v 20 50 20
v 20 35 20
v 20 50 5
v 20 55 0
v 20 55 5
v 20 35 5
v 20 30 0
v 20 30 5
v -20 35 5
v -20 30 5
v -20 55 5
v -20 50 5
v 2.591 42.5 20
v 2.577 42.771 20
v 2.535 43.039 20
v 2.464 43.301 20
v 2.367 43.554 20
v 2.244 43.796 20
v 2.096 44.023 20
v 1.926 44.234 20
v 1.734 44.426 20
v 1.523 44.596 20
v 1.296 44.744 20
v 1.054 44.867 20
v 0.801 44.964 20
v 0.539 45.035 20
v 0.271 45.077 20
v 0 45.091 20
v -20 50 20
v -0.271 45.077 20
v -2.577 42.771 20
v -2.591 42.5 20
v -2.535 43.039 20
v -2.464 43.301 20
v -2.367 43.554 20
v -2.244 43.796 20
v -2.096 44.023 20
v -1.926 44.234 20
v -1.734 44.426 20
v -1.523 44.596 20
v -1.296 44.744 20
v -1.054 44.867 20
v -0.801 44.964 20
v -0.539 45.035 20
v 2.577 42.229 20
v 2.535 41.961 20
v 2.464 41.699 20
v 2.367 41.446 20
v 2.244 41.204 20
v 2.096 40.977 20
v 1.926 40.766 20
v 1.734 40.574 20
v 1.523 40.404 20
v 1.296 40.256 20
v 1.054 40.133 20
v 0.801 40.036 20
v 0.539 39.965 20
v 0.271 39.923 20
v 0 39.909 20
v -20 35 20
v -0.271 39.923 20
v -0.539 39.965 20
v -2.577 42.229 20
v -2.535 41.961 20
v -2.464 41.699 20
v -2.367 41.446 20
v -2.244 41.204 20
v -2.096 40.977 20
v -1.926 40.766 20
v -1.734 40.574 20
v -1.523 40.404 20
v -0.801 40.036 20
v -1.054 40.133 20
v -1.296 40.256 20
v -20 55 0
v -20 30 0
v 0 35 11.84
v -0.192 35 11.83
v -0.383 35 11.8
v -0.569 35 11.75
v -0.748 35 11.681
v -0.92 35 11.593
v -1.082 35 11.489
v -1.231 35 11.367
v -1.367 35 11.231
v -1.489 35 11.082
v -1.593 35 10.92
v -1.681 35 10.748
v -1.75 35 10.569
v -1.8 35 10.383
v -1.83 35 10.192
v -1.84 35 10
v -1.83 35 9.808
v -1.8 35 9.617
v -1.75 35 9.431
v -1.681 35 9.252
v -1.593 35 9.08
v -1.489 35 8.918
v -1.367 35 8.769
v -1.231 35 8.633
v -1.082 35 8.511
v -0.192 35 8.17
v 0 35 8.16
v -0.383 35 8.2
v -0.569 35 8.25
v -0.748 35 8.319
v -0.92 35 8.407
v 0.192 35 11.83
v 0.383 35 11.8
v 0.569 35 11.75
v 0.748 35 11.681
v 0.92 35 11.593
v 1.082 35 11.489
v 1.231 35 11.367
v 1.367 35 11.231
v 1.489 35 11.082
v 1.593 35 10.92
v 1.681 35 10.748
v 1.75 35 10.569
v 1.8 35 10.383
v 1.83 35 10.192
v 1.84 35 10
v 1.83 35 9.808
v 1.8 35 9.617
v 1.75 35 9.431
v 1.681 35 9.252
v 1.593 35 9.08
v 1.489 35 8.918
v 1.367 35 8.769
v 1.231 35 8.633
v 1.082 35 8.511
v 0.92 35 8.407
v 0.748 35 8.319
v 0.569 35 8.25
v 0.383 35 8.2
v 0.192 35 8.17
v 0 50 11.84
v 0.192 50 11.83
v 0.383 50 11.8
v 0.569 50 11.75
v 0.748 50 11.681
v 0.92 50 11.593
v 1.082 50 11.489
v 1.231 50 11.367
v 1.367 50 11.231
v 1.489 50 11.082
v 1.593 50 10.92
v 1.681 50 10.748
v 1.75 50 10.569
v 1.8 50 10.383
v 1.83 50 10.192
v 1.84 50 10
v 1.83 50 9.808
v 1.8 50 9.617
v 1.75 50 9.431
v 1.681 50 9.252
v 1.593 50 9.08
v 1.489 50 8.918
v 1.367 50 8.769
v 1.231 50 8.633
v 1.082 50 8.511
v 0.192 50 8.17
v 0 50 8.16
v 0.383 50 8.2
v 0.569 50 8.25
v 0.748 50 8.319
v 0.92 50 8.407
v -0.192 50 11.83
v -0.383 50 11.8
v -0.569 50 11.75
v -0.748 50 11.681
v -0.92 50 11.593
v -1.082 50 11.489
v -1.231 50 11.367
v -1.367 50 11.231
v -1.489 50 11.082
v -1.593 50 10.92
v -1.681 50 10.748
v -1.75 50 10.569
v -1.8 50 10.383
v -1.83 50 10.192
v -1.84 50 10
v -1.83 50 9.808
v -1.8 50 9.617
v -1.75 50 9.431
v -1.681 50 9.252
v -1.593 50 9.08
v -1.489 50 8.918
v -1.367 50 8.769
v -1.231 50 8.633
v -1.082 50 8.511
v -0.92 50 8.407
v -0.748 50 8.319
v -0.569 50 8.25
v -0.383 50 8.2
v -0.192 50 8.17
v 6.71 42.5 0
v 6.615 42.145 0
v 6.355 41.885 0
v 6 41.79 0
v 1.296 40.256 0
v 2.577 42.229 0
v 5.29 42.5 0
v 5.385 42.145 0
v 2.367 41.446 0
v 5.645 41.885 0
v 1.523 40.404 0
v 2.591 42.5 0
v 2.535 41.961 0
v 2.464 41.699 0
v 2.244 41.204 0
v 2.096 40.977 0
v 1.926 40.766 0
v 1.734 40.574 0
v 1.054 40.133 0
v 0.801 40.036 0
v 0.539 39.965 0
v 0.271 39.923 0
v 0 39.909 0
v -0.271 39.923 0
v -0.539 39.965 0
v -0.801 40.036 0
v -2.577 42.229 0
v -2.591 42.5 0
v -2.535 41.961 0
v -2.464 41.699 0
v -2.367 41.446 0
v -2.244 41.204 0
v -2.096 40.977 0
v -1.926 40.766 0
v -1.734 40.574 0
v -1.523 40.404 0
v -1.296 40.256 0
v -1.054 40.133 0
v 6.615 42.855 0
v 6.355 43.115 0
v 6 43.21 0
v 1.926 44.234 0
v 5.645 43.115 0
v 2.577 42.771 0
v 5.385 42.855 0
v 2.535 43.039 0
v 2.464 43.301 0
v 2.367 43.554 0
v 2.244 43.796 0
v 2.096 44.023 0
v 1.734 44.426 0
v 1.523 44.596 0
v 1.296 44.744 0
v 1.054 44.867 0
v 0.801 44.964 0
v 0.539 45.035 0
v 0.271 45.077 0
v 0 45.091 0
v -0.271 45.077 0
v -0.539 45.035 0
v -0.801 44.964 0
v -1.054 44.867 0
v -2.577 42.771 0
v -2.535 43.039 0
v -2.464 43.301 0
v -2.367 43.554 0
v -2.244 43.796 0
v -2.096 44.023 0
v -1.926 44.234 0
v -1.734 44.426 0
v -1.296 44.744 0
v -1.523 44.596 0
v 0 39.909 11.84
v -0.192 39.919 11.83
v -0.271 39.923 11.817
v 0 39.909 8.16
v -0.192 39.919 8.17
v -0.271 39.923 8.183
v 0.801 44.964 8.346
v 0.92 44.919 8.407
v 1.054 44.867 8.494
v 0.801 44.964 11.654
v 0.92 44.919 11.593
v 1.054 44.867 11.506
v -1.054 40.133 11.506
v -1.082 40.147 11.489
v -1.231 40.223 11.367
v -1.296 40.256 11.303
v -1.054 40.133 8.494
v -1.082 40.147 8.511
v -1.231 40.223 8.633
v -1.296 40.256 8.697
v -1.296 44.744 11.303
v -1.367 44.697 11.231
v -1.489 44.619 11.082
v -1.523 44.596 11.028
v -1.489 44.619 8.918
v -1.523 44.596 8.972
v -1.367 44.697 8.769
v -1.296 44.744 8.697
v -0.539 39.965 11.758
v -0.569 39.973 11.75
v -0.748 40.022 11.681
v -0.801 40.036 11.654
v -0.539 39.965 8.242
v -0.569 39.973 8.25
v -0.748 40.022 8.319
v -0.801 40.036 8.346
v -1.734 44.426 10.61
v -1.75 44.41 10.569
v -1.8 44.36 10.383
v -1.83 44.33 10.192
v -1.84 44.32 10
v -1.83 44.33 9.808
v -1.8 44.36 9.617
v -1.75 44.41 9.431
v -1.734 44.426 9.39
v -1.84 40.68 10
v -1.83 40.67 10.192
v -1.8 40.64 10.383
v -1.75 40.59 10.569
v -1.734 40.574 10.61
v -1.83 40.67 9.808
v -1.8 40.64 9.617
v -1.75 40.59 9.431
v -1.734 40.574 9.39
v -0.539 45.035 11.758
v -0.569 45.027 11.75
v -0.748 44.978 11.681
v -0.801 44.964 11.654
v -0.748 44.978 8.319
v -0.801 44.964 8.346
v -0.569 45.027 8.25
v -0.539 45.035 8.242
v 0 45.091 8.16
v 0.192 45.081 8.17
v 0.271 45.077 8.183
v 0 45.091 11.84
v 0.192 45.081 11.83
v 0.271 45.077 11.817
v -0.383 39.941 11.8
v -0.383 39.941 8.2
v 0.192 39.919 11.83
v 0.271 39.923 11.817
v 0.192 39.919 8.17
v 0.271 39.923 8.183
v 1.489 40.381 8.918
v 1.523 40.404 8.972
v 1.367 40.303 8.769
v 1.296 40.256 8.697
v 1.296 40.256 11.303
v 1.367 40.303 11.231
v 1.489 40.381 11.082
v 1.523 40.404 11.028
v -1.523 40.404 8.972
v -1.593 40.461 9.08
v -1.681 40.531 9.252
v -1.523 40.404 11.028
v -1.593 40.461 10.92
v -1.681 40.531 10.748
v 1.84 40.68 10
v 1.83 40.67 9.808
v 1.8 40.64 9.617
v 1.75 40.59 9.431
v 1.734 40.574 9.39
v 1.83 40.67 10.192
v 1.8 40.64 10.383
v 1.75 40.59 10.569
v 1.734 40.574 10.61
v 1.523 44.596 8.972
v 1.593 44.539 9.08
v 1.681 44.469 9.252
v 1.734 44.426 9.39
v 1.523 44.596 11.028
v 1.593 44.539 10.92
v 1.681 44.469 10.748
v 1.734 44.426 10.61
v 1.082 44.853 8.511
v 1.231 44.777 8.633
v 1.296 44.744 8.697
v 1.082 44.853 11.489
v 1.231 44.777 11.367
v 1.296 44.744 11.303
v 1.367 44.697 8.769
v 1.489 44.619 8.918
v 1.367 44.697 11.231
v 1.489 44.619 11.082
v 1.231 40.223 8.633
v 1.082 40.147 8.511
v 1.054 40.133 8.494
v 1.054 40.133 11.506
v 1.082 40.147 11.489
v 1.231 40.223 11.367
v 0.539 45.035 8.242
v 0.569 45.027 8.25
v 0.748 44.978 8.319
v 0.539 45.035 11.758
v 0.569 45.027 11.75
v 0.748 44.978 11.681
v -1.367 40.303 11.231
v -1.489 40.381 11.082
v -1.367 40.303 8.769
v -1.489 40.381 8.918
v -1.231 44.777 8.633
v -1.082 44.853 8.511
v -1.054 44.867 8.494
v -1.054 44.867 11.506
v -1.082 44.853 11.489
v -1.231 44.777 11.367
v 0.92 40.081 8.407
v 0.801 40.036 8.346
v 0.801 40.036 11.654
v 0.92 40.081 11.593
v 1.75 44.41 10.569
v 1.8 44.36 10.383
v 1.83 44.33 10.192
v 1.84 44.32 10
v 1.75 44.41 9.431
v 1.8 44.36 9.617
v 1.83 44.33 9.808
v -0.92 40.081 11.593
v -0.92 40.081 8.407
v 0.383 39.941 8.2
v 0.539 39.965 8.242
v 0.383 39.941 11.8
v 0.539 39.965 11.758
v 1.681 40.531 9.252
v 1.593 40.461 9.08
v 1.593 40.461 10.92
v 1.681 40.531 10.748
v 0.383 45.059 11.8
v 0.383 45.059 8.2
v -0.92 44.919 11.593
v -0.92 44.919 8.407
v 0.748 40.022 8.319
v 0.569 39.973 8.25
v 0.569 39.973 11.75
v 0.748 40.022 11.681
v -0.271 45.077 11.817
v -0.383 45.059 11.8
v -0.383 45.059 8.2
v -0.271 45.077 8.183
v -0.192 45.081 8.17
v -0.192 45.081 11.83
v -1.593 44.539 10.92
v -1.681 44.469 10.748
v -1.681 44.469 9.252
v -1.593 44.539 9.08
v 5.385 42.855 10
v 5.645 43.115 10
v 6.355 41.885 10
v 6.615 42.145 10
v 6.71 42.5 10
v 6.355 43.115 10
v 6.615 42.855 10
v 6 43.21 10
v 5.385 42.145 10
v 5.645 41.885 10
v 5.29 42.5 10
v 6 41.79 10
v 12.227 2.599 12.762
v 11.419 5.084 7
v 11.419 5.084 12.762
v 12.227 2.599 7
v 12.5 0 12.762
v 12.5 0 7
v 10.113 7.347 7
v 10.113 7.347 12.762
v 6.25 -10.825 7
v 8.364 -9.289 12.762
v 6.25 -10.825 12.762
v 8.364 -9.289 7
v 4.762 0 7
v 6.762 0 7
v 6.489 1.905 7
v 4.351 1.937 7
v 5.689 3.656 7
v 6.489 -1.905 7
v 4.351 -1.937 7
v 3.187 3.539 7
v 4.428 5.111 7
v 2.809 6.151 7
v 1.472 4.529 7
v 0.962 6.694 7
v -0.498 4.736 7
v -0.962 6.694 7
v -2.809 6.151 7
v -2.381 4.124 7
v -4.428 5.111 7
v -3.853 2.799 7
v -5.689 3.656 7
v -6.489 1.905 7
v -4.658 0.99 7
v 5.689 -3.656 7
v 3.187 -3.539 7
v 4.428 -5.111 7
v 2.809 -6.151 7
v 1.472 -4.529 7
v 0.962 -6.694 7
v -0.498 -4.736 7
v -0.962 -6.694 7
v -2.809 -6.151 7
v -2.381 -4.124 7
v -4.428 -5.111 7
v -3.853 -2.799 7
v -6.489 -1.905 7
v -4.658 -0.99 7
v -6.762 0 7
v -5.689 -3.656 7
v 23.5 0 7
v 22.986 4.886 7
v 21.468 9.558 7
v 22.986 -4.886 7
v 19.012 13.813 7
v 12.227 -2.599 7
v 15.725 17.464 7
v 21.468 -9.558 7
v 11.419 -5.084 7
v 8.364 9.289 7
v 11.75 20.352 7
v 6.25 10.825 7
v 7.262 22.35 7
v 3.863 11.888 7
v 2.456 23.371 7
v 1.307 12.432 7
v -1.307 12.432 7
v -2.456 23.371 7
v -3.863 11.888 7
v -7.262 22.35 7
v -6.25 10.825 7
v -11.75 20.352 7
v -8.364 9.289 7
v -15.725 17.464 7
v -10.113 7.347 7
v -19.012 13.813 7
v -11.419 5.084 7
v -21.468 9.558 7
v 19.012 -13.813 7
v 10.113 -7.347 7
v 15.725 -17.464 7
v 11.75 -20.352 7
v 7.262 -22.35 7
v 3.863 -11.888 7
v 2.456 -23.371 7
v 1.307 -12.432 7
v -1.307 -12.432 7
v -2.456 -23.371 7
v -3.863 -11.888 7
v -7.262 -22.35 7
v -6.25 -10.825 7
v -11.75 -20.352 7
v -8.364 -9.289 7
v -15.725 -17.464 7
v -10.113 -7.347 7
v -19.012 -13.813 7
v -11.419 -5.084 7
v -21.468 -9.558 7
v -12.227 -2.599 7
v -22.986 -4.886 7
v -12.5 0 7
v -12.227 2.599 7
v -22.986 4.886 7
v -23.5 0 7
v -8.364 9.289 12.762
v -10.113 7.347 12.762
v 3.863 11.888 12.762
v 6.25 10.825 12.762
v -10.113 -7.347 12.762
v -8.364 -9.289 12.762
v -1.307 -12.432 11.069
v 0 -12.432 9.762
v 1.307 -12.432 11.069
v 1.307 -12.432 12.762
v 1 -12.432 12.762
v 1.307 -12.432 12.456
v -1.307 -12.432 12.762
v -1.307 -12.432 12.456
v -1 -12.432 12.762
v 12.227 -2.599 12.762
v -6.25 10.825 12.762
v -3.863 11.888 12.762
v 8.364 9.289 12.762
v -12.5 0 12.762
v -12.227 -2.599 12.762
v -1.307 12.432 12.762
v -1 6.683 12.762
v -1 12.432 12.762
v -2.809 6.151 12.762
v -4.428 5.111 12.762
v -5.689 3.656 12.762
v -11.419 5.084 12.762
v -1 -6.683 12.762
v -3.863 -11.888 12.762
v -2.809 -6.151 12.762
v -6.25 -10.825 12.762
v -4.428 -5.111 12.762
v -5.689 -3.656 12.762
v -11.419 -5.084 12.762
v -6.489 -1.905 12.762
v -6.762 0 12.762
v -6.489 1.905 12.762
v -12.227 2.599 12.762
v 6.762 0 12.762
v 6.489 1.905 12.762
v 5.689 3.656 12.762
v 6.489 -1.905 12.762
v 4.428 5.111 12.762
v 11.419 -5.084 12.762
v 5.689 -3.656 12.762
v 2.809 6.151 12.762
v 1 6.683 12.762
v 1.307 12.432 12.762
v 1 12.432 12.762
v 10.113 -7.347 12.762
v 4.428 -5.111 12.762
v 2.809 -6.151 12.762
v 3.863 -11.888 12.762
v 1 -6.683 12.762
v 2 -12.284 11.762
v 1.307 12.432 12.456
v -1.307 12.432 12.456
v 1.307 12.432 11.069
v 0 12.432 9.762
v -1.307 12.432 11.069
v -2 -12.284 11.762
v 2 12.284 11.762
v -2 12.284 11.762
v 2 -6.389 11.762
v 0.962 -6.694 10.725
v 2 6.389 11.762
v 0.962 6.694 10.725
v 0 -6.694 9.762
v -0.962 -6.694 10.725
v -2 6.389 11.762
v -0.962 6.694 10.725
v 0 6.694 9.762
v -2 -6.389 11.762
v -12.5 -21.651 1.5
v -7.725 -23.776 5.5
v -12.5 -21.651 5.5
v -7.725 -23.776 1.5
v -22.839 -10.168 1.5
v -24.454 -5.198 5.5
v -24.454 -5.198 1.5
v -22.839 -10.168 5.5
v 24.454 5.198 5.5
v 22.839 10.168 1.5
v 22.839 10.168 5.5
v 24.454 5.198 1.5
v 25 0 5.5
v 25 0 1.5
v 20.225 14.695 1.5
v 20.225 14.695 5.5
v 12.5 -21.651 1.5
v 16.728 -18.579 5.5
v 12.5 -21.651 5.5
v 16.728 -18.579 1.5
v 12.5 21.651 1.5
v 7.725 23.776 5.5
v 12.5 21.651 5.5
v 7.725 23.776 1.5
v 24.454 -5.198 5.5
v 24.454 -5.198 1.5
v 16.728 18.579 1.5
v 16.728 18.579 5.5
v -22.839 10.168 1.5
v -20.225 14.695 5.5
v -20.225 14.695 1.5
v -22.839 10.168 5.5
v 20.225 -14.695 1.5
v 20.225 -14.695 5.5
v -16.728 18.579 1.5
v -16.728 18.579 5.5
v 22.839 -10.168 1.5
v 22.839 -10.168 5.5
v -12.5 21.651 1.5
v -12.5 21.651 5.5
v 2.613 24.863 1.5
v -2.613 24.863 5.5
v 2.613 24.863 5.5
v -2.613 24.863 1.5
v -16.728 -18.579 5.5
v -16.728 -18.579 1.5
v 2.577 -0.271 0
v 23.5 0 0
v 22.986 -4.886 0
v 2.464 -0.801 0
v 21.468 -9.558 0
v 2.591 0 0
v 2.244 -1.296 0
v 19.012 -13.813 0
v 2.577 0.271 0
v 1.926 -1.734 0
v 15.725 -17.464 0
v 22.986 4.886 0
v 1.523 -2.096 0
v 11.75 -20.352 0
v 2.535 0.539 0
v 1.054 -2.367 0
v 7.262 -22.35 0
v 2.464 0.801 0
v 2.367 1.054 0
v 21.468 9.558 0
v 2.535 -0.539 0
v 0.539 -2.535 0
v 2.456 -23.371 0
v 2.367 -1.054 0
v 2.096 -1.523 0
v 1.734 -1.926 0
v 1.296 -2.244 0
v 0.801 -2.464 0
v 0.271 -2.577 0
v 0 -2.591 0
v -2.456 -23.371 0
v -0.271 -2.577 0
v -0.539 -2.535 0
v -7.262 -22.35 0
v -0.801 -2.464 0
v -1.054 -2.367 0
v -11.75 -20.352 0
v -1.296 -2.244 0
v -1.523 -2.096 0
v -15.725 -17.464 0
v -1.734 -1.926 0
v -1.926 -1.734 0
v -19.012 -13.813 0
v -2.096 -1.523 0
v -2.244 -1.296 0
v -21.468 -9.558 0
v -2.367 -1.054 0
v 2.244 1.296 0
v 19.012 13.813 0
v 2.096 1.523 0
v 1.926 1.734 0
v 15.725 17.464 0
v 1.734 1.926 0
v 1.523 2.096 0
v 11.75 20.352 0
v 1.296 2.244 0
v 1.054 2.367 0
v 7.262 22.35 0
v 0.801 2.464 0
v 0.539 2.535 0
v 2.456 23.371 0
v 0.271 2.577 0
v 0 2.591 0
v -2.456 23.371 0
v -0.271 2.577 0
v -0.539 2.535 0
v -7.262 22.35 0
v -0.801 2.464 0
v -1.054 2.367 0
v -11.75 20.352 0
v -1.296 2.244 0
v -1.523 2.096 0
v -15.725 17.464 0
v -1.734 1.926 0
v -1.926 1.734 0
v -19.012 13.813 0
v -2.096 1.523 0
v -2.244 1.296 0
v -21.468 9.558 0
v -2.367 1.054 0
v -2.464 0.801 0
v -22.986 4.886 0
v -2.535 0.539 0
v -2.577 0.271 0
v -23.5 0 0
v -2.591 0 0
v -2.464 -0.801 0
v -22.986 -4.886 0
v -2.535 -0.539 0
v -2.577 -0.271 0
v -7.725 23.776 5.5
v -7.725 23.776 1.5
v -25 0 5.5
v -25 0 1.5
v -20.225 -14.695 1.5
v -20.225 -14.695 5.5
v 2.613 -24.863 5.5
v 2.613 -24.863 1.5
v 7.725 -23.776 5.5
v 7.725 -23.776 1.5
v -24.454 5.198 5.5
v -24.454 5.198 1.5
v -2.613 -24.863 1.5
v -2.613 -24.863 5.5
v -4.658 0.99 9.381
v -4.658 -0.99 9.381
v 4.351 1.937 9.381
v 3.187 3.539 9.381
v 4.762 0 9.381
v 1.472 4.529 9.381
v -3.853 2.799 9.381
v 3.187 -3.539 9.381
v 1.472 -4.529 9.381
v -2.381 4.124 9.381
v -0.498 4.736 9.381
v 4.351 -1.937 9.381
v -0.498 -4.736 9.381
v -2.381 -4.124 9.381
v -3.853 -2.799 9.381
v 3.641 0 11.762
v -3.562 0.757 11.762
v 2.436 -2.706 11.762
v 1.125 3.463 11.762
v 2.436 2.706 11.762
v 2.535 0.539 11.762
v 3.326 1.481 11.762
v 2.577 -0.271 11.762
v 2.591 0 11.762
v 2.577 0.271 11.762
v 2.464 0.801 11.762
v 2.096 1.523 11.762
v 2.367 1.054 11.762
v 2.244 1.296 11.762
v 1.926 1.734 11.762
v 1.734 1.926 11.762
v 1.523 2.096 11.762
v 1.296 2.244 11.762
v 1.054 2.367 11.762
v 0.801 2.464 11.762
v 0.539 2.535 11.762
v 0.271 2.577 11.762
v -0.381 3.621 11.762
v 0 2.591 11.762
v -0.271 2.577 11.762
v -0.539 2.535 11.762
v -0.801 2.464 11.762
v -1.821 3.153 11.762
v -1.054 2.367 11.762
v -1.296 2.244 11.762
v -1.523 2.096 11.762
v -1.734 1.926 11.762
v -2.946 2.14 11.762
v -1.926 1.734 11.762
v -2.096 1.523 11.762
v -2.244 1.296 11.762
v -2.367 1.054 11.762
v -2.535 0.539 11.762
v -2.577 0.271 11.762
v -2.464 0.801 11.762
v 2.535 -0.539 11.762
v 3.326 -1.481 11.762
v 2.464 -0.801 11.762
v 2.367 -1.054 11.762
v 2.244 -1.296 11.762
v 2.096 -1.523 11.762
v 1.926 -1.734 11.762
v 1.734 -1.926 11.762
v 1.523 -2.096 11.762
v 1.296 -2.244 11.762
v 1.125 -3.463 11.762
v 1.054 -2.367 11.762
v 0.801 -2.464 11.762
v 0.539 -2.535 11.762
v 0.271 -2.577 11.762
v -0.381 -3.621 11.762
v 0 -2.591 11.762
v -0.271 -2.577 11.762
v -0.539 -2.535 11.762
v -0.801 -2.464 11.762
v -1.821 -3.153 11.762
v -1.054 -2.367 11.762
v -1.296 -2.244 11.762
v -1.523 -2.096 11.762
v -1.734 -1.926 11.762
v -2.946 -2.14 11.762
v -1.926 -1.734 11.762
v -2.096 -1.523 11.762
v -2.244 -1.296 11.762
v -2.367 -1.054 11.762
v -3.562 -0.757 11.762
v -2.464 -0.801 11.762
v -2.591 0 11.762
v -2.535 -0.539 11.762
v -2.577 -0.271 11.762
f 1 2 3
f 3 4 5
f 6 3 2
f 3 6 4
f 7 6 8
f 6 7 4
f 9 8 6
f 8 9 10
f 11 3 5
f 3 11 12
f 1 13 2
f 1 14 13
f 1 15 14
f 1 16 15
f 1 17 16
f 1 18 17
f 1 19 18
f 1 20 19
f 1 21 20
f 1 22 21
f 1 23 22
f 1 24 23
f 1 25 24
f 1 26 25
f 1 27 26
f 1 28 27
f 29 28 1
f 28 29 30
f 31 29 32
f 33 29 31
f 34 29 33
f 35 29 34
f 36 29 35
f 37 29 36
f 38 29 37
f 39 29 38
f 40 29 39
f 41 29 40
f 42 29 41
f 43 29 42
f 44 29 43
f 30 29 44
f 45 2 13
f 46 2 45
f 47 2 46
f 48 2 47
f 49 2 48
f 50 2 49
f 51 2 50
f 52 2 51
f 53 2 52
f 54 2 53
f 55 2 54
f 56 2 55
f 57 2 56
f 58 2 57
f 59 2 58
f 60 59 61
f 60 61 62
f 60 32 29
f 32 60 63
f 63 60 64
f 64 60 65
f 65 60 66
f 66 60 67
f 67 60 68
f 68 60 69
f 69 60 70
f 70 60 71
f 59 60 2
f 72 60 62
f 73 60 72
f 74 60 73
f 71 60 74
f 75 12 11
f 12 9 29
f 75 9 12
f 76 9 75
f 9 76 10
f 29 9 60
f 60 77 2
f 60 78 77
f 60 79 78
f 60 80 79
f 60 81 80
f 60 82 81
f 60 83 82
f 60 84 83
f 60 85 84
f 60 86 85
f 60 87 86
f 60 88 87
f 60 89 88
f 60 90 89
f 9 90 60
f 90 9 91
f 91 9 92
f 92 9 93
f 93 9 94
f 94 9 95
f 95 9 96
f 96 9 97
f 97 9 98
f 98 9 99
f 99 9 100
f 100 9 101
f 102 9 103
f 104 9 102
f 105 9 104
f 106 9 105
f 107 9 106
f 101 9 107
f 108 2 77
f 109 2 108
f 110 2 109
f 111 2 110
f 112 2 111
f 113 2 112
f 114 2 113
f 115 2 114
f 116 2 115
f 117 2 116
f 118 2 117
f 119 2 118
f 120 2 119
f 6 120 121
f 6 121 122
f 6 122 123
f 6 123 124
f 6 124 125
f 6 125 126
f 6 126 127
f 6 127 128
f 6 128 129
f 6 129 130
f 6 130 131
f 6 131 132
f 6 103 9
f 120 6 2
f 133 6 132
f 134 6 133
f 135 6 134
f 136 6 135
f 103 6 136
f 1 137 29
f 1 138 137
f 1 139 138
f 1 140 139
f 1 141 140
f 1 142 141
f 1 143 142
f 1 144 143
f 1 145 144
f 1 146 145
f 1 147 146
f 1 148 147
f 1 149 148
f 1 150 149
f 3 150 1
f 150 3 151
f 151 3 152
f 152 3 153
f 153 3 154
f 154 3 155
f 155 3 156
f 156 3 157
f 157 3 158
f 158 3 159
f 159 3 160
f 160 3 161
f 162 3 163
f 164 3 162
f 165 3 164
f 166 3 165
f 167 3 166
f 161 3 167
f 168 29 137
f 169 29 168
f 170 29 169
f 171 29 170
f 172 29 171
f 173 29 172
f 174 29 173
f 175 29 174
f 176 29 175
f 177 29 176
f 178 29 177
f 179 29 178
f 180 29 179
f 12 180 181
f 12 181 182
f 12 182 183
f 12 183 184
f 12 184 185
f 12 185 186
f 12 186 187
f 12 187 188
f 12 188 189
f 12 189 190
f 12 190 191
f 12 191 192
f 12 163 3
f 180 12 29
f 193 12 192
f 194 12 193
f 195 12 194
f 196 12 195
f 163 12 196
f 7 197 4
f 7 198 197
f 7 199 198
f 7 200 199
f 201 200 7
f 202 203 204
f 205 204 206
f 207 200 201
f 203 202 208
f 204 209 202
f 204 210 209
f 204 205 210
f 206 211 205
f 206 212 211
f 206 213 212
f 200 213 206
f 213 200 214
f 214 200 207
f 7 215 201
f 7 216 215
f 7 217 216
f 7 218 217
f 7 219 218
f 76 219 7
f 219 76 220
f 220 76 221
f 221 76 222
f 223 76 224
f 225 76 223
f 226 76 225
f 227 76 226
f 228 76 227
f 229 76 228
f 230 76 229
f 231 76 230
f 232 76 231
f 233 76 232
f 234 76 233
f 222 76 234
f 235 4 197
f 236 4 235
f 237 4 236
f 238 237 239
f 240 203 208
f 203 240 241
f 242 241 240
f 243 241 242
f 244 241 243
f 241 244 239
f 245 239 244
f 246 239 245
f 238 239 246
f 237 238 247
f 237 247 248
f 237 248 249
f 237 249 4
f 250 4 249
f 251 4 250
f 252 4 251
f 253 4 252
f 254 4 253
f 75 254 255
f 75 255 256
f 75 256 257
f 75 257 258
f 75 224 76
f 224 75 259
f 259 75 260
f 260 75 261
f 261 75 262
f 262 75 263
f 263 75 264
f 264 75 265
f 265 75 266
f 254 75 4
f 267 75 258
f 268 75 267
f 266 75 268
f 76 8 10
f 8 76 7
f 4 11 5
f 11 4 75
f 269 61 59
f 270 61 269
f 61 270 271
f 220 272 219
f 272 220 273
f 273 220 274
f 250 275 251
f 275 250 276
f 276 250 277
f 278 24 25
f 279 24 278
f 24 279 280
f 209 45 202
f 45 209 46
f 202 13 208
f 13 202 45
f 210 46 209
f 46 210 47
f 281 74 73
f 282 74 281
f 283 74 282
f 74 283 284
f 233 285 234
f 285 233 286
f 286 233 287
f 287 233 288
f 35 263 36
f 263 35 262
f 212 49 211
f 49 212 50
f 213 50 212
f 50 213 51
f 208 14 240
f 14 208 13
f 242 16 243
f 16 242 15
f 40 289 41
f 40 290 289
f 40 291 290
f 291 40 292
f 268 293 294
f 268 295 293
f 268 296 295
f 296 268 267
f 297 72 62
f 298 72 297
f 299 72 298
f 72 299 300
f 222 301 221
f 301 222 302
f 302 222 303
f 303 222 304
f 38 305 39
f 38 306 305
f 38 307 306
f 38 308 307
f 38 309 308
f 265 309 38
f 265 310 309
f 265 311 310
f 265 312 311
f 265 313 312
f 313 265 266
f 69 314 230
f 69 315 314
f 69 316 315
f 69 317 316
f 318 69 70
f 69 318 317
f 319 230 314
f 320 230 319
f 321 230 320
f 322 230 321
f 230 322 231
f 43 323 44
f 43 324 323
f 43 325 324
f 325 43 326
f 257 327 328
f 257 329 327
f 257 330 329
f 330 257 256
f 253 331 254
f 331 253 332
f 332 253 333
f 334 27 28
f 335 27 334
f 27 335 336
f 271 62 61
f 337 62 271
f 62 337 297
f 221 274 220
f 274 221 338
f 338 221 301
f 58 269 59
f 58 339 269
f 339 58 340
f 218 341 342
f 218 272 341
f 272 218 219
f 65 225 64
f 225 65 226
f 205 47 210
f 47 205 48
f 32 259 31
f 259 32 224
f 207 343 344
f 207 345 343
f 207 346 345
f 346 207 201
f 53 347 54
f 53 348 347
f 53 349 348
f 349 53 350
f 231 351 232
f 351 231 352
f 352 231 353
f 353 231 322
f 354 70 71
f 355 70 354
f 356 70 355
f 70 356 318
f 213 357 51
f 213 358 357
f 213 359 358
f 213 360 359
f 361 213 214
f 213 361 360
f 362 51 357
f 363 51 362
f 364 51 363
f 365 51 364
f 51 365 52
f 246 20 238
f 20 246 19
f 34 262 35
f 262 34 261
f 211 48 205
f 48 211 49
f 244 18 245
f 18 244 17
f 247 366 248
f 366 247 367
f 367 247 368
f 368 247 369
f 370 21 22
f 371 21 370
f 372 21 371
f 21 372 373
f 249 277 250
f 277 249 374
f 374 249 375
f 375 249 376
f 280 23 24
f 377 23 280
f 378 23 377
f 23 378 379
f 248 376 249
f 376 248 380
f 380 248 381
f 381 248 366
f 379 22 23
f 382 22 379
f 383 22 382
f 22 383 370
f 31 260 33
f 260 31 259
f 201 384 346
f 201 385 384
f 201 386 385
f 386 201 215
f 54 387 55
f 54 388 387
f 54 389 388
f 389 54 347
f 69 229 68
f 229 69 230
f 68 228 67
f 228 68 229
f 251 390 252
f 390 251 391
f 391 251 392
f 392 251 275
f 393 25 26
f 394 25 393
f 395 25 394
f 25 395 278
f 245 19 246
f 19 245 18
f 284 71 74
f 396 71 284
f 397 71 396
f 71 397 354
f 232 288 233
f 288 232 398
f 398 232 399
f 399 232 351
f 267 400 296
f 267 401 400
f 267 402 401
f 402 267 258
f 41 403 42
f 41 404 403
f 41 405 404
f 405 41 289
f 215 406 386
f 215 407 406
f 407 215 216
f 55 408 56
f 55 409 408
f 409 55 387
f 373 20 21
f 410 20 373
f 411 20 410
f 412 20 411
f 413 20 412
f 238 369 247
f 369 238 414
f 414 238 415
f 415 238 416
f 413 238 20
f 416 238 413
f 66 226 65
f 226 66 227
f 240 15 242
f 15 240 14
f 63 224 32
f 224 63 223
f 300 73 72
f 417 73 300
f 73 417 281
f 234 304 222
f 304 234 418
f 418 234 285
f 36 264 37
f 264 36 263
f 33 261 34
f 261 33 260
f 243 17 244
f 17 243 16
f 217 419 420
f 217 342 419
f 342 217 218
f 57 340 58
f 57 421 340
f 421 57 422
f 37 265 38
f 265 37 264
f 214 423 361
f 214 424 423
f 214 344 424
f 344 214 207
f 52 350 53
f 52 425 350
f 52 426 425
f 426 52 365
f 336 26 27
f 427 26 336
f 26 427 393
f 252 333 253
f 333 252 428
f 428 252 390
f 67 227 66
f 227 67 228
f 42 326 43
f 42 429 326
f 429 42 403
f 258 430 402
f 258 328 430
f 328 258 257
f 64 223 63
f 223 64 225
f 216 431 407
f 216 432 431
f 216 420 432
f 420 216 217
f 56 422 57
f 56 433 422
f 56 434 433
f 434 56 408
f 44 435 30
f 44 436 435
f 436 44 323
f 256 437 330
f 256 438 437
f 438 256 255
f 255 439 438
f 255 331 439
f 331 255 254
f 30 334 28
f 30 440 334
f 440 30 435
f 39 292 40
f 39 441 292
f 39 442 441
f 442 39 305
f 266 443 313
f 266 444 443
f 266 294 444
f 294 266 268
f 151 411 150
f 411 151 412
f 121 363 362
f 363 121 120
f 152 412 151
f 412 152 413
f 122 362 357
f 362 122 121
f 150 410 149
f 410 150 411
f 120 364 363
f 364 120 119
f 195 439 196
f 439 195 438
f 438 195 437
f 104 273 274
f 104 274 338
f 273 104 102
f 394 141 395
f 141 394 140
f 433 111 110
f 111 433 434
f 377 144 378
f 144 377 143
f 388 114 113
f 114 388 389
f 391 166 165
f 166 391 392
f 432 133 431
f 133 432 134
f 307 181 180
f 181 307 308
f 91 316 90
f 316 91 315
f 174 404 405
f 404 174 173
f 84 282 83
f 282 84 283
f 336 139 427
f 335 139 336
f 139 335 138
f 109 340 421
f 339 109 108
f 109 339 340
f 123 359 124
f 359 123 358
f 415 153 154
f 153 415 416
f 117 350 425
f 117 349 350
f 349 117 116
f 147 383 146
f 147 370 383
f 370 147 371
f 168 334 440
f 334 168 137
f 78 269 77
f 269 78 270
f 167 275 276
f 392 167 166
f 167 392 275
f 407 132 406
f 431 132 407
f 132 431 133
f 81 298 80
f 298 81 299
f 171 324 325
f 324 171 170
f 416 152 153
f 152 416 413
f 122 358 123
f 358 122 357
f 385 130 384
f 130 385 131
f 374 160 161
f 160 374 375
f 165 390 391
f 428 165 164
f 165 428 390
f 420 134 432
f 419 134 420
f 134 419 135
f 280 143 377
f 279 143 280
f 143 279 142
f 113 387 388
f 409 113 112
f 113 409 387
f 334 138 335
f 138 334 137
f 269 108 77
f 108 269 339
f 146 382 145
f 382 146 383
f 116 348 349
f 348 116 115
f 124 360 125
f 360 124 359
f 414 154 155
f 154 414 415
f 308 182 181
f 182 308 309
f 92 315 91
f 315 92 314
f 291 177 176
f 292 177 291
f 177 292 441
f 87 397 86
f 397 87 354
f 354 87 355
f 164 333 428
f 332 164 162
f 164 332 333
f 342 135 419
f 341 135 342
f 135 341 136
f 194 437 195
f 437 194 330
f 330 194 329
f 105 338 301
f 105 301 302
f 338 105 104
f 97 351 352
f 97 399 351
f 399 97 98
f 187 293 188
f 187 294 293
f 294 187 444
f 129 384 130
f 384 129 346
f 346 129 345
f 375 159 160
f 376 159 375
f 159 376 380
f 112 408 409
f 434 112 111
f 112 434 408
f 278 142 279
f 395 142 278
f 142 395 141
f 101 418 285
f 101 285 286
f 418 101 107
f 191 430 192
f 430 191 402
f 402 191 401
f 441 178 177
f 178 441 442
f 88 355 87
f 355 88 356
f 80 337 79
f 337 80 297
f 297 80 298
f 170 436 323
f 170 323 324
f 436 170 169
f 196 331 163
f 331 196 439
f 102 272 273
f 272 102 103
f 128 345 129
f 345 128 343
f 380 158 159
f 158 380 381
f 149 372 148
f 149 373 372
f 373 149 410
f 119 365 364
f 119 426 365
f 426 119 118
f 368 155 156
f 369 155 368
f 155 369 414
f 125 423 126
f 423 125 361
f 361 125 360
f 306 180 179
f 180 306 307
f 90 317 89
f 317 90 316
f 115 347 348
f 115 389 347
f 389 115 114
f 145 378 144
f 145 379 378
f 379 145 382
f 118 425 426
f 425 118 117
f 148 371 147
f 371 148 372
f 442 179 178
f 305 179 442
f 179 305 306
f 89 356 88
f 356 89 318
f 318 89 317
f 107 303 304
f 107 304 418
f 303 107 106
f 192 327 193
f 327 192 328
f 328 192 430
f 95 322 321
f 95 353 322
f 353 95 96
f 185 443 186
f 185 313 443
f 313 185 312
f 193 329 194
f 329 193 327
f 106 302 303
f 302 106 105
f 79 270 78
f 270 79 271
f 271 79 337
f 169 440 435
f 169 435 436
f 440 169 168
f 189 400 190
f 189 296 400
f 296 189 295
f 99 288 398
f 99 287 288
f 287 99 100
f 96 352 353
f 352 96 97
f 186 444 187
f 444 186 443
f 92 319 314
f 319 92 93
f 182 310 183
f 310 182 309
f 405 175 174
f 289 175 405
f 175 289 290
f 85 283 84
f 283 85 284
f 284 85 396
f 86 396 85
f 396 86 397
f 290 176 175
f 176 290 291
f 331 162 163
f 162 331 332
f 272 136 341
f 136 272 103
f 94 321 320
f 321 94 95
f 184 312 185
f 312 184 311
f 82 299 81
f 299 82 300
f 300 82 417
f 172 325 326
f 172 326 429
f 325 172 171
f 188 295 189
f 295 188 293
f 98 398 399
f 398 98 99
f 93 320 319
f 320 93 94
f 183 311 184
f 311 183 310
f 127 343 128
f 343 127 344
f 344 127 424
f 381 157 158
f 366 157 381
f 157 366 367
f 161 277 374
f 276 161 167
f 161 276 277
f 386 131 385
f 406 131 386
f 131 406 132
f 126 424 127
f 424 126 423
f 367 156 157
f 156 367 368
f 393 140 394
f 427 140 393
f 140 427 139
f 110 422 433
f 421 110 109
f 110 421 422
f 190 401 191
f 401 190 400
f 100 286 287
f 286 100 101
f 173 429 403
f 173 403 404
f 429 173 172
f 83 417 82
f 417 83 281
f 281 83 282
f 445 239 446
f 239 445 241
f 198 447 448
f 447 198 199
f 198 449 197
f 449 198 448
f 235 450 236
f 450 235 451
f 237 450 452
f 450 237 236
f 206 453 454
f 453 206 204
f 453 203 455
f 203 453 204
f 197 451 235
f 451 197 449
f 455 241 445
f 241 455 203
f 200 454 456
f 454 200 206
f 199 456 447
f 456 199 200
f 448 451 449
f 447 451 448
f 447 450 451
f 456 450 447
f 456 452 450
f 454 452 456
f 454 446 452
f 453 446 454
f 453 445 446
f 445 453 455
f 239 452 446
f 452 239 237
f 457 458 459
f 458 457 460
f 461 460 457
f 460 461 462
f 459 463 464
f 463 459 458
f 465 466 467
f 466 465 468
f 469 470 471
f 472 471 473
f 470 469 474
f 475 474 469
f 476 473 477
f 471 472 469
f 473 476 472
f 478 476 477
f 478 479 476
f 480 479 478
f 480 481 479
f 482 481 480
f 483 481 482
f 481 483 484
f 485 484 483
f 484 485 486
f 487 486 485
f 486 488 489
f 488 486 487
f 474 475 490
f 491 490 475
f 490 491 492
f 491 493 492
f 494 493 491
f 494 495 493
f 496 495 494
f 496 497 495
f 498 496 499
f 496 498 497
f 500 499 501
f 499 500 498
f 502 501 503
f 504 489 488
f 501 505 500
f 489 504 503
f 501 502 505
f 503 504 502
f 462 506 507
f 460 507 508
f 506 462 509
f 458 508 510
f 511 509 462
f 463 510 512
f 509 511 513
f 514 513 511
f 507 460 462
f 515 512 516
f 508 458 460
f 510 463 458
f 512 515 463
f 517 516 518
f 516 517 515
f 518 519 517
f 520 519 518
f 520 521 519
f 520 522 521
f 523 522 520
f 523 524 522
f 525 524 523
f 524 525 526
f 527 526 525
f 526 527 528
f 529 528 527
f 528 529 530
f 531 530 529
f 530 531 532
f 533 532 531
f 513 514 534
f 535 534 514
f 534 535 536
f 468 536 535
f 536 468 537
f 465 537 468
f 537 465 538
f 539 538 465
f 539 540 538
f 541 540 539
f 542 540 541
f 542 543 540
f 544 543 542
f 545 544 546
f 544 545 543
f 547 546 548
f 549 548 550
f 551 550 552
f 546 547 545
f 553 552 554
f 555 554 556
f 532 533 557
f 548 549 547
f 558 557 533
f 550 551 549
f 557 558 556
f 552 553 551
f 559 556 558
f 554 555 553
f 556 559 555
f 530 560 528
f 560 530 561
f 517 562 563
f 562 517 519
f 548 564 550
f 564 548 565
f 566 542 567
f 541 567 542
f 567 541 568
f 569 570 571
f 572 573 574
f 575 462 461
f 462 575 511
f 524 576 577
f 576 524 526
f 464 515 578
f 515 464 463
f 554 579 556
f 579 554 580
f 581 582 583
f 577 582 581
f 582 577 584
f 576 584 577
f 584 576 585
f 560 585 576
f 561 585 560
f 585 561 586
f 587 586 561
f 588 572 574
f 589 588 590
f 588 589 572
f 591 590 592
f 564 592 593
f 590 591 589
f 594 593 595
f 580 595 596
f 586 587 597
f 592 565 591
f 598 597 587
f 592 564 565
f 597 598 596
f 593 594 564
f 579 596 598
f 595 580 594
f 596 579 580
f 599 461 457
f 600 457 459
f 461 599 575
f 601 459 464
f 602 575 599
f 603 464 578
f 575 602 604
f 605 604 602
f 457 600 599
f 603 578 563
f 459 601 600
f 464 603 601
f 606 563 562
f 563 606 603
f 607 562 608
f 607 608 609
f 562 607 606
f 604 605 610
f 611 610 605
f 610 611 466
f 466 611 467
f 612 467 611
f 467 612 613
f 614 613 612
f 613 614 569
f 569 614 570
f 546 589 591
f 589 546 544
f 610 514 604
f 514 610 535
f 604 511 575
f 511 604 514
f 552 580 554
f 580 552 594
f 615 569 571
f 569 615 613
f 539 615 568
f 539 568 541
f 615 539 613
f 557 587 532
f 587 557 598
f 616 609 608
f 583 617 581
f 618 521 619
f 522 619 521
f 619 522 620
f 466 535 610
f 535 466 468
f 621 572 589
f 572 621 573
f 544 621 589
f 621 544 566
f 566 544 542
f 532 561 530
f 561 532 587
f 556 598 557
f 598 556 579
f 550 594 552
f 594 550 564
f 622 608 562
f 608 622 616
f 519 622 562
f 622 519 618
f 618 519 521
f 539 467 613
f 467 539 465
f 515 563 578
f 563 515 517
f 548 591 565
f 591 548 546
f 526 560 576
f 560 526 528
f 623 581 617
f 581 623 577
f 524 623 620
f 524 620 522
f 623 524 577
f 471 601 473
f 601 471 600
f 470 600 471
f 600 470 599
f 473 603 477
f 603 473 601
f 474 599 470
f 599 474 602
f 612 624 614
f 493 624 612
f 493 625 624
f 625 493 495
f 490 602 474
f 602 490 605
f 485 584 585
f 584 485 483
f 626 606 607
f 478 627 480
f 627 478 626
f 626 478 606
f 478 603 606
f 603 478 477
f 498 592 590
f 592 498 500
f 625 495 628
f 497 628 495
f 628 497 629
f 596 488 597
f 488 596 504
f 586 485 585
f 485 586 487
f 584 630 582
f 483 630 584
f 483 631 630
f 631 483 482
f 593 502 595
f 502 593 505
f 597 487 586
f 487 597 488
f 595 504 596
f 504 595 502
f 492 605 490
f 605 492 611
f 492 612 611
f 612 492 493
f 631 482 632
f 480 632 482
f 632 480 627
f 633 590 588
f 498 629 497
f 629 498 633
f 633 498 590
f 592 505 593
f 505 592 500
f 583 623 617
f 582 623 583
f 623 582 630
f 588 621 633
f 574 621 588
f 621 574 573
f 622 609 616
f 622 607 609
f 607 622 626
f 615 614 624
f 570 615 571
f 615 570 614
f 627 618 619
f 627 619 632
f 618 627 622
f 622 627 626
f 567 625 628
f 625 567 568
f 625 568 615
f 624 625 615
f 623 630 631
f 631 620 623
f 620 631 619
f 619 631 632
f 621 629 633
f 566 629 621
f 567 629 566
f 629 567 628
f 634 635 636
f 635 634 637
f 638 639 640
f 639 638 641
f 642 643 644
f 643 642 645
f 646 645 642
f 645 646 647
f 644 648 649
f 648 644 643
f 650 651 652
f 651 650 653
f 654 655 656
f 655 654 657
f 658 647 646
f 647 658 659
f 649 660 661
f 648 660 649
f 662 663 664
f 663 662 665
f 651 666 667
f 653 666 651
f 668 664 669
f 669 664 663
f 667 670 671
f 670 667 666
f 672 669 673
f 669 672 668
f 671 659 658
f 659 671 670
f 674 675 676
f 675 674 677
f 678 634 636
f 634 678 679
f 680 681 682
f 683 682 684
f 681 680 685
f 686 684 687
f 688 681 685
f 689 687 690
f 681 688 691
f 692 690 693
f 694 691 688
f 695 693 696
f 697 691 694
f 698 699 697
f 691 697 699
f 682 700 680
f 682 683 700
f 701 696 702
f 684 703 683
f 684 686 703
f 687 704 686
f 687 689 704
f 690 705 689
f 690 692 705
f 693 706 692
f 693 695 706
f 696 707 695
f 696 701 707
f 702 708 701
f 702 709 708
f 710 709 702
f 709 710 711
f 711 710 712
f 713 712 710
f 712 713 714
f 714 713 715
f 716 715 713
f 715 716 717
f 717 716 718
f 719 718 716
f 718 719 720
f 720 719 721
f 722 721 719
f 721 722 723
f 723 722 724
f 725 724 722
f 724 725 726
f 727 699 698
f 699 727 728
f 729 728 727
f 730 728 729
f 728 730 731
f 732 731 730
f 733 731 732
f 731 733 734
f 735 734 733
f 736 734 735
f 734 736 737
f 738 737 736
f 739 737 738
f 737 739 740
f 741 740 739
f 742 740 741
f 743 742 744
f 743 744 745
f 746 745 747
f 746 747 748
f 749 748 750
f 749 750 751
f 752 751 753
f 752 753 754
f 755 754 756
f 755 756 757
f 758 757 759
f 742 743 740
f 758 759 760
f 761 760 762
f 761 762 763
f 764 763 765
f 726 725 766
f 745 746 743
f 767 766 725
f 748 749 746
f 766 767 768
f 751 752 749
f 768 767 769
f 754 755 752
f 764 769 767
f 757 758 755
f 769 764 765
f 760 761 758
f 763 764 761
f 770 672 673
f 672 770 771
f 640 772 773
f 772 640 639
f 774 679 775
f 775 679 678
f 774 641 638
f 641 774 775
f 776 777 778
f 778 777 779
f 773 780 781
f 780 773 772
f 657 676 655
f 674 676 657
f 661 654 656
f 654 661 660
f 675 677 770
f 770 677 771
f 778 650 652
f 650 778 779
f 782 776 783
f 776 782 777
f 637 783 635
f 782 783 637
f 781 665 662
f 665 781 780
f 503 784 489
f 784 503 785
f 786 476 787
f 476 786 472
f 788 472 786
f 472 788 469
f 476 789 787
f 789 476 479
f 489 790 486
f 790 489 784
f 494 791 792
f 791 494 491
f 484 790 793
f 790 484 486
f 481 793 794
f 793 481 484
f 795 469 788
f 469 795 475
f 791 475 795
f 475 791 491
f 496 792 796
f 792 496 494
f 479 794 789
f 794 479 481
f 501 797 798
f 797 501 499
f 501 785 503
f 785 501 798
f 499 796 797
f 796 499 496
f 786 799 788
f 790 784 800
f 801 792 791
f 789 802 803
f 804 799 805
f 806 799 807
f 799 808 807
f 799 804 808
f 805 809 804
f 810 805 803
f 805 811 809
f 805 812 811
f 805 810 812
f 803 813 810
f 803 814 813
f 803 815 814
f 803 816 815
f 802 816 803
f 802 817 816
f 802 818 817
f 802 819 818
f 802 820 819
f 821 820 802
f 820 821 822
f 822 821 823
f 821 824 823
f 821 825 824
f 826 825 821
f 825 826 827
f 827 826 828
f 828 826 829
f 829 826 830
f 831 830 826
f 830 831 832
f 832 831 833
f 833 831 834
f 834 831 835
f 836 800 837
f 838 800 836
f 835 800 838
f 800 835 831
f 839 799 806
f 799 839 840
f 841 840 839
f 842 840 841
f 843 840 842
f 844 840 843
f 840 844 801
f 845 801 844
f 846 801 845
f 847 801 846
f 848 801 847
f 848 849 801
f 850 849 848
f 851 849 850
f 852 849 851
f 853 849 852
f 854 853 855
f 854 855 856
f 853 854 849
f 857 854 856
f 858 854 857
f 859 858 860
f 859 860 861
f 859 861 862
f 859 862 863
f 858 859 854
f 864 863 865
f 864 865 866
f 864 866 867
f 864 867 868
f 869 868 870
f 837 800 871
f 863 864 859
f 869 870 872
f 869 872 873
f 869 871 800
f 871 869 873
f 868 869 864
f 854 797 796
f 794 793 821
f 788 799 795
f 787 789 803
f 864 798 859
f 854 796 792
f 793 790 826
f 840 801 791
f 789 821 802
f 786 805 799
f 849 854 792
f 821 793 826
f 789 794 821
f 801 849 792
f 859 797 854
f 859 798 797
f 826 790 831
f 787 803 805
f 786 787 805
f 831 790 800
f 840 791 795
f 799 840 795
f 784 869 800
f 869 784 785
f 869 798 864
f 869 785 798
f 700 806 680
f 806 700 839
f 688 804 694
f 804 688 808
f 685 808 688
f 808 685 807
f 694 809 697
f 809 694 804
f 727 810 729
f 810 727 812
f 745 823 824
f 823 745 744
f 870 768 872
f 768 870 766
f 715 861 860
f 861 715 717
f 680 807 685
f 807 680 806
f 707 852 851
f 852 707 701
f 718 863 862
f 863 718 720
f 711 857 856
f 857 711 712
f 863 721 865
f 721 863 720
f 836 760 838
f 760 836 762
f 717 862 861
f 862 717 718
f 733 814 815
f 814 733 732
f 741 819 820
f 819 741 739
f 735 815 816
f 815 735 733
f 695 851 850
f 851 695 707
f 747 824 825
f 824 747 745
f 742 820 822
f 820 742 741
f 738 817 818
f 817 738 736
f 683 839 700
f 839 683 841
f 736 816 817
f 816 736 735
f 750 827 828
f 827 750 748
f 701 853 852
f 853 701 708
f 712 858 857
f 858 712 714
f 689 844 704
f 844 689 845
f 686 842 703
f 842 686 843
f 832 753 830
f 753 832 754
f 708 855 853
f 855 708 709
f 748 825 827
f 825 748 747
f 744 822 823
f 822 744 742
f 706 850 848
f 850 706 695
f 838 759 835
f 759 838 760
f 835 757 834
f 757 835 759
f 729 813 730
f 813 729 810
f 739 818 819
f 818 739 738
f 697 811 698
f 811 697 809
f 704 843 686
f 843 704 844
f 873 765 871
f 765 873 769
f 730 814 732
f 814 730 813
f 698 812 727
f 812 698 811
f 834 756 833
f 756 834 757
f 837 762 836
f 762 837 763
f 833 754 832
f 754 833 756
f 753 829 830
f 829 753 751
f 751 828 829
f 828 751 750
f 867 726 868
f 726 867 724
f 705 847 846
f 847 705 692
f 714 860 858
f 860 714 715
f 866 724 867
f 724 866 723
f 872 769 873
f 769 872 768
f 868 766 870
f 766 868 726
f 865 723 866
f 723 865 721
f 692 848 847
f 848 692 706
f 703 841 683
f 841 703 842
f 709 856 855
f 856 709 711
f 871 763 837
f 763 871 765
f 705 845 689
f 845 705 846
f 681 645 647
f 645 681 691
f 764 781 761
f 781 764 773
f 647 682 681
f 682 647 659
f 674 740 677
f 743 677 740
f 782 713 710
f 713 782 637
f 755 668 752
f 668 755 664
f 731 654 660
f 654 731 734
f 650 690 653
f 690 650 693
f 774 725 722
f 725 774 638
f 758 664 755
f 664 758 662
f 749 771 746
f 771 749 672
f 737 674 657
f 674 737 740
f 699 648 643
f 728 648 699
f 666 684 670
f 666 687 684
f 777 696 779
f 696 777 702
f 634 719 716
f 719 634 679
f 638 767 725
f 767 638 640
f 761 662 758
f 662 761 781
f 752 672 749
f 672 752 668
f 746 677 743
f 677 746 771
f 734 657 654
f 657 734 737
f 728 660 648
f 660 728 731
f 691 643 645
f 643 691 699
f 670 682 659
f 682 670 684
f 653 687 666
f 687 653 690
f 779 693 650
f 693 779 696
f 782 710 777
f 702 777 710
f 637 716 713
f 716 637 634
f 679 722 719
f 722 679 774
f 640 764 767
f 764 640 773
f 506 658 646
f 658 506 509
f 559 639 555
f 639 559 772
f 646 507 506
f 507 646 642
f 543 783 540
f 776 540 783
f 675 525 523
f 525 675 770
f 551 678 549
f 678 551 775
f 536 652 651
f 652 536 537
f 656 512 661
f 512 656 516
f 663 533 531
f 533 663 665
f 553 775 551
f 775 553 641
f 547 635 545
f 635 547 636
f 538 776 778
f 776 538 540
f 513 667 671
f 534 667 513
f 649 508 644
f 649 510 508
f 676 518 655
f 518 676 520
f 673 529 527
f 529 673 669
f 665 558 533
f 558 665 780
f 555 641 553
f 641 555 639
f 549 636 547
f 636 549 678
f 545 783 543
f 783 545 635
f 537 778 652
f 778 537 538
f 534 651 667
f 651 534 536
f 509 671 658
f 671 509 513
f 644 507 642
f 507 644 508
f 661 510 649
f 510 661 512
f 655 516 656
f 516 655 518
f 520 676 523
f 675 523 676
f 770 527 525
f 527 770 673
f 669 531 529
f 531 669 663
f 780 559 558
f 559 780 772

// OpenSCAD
/*
Copyright (c) 2013 Chad Kirby

Permission is hereby granted, free of charge, to any person obtaining a copy
of this software and associated documentation files (the "Software"), to deal
in the Software without restriction, including without limitation the rights
to use, copy, modify, merge, publish, distribute, sublicense, and/or sell
copies of the Software, and to permit persons to whom the Software is
furnished to do so, subject to the following conditions:

The above copyright notice and this permission notice shall be included in
all copies or substantial portions of the Software.

THE SOFTWARE IS PROVIDED "AS IS", WITHOUT WARRANTY OF ANY KIND, EXPRESS OR
IMPLIED, INCLUDING BUT NOT LIMITED TO THE WARRANTIES OF MERCHANTABILITY,
FITNESS FOR A PARTICULAR PURPOSE AND NONINFRINGEMENT. IN NO EVENT SHALL THE
AUTHORS OR COPYRIGHT HOLDERS BE LIABLE FOR ANY CLAIM, DAMAGES OR OTHER
LIABILITY, WHETHER IN AN ACTION OF CONTRACT, TORT OR OTHERWISE, ARISING FROM,
OUT OF OR IN CONNECTION WITH THE SOFTWARE OR THE USE OR OTHER DEALINGS IN
THE SOFTWARE.
*/
function inch(in) = 25.4*in;

steel_mandrel_diameter = inch(3/16);
wire_diameter = 1;
tang_offset = 6; // from center of mandrel
printer_fudge_factor = 0.21;

mandrel_setscrew_tap = 3.26; // 8-32

translate([-20, 50, height])
rotate([180,0,0])
winder_base();
winder();

  height=20;
  len = 40;
  widtop=25;
  widbase = 15;
module winder_base() {
  stepDelta = wire_diameter/20;
  difference() {
  	union() {
      cube(size=[len, widbase, height-5], center=false);
      translate([0,-(widtop-widbase)/2,height-5])
    	cube(size=[len, widtop, 5], center=false);
    }
    translate([len/2,widbase/2,0])
      mandrel_hole();
    // set screw
    translate([len/2,0,widbase/1.5])
    rotate([-90,0,0])
      #cylinder(r=mandrel_setscrew_tap/2+printer_fudge_factor, h=widbase, center=false, $fn=60);
    // tang
    translate([len/2 + tang_offset,widbase/2,height-10])
      #cylinder(r=wire_diameter/2+printer_fudge_factor, h=10, center=false, $fn=12);
    // for (i = [1 : stepDelta : stepDelta]) {
    //   assign(
    //     p1 = [
    //       len/2 + widtop/2 * cos(30 + i * 360),
    //       widbase/2 + widtop/2 * sin(30 + i * 360)          
    //     ],
    //     p0 = [
    //       len/2 + widtop/2 * cos(30 + (i-stepDelta) * 360),
    //       widbase/2 + widtop/2 * sin(30 + (i-stepDelta) * 360)
    //     ]
    //   ) {
    //     translate([0, 0, height - (i-stepDelta) * wire_diameter])
    //     #linear_extrude(height = wire_diameter)
    //     polygon([
    //       [len/2, widbase/2],
    //       p0, p1
    //     ]);
    //   }      
    // }

  }
}

module winder() {
  r = 25;
  h=7;
  intersection() {
  difference() {
    union() {
      cylinder(r=r, h=h, center=false);
      translate([0,0,h])
      difference() {
        cylinder(r=widtop/2, h=steel_mandrel_diameter+wire_diameter, center=false);
        cylinder(r=steel_mandrel_diameter + wire_diameter*2, h=steel_mandrel_diameter*2, center=false);
        translate([0,0,steel_mandrel_diameter])
        rotate([90,0,0])
        #cylinder(r=wire_diameter*2, h=widtop, center=true, $fn=4);
      }
      translate([0,0,h])
      cylinder(r=steel_mandrel_diameter, h=steel_mandrel_diameter/2, center=false);
      translate([0,0,h+steel_mandrel_diameter/2])
      cylinder(r1=steel_mandrel_diameter, r2=steel_mandrel_diameter/2+1.26, h=steel_mandrel_diameter/2, center=false);
    }
    mandrel_hole();
    for (a = [360 : 30 : 30]) {
      translate([
        (r+2.5) * cos(a),
        (r+2.5) * sin(a),
        0
        ])
      cylinder(r=5, h=h, center=false);
    }
  }
  translate([0,0,-r+1.5])
    cylinder(r1=0, r2=r*2, h=r*2, center=false);
  translate([0,0,r+h-1.5])
    rotate([180,0,0])
      cylinder(r1=0, r2=r*2, h=r*2, center=false);
  }
}

module mandrel_hole() {
  cylinder(r=steel_mandrel_diameter/2+printer_fudge_factor, h=height, center=false, $fn=60);
}
